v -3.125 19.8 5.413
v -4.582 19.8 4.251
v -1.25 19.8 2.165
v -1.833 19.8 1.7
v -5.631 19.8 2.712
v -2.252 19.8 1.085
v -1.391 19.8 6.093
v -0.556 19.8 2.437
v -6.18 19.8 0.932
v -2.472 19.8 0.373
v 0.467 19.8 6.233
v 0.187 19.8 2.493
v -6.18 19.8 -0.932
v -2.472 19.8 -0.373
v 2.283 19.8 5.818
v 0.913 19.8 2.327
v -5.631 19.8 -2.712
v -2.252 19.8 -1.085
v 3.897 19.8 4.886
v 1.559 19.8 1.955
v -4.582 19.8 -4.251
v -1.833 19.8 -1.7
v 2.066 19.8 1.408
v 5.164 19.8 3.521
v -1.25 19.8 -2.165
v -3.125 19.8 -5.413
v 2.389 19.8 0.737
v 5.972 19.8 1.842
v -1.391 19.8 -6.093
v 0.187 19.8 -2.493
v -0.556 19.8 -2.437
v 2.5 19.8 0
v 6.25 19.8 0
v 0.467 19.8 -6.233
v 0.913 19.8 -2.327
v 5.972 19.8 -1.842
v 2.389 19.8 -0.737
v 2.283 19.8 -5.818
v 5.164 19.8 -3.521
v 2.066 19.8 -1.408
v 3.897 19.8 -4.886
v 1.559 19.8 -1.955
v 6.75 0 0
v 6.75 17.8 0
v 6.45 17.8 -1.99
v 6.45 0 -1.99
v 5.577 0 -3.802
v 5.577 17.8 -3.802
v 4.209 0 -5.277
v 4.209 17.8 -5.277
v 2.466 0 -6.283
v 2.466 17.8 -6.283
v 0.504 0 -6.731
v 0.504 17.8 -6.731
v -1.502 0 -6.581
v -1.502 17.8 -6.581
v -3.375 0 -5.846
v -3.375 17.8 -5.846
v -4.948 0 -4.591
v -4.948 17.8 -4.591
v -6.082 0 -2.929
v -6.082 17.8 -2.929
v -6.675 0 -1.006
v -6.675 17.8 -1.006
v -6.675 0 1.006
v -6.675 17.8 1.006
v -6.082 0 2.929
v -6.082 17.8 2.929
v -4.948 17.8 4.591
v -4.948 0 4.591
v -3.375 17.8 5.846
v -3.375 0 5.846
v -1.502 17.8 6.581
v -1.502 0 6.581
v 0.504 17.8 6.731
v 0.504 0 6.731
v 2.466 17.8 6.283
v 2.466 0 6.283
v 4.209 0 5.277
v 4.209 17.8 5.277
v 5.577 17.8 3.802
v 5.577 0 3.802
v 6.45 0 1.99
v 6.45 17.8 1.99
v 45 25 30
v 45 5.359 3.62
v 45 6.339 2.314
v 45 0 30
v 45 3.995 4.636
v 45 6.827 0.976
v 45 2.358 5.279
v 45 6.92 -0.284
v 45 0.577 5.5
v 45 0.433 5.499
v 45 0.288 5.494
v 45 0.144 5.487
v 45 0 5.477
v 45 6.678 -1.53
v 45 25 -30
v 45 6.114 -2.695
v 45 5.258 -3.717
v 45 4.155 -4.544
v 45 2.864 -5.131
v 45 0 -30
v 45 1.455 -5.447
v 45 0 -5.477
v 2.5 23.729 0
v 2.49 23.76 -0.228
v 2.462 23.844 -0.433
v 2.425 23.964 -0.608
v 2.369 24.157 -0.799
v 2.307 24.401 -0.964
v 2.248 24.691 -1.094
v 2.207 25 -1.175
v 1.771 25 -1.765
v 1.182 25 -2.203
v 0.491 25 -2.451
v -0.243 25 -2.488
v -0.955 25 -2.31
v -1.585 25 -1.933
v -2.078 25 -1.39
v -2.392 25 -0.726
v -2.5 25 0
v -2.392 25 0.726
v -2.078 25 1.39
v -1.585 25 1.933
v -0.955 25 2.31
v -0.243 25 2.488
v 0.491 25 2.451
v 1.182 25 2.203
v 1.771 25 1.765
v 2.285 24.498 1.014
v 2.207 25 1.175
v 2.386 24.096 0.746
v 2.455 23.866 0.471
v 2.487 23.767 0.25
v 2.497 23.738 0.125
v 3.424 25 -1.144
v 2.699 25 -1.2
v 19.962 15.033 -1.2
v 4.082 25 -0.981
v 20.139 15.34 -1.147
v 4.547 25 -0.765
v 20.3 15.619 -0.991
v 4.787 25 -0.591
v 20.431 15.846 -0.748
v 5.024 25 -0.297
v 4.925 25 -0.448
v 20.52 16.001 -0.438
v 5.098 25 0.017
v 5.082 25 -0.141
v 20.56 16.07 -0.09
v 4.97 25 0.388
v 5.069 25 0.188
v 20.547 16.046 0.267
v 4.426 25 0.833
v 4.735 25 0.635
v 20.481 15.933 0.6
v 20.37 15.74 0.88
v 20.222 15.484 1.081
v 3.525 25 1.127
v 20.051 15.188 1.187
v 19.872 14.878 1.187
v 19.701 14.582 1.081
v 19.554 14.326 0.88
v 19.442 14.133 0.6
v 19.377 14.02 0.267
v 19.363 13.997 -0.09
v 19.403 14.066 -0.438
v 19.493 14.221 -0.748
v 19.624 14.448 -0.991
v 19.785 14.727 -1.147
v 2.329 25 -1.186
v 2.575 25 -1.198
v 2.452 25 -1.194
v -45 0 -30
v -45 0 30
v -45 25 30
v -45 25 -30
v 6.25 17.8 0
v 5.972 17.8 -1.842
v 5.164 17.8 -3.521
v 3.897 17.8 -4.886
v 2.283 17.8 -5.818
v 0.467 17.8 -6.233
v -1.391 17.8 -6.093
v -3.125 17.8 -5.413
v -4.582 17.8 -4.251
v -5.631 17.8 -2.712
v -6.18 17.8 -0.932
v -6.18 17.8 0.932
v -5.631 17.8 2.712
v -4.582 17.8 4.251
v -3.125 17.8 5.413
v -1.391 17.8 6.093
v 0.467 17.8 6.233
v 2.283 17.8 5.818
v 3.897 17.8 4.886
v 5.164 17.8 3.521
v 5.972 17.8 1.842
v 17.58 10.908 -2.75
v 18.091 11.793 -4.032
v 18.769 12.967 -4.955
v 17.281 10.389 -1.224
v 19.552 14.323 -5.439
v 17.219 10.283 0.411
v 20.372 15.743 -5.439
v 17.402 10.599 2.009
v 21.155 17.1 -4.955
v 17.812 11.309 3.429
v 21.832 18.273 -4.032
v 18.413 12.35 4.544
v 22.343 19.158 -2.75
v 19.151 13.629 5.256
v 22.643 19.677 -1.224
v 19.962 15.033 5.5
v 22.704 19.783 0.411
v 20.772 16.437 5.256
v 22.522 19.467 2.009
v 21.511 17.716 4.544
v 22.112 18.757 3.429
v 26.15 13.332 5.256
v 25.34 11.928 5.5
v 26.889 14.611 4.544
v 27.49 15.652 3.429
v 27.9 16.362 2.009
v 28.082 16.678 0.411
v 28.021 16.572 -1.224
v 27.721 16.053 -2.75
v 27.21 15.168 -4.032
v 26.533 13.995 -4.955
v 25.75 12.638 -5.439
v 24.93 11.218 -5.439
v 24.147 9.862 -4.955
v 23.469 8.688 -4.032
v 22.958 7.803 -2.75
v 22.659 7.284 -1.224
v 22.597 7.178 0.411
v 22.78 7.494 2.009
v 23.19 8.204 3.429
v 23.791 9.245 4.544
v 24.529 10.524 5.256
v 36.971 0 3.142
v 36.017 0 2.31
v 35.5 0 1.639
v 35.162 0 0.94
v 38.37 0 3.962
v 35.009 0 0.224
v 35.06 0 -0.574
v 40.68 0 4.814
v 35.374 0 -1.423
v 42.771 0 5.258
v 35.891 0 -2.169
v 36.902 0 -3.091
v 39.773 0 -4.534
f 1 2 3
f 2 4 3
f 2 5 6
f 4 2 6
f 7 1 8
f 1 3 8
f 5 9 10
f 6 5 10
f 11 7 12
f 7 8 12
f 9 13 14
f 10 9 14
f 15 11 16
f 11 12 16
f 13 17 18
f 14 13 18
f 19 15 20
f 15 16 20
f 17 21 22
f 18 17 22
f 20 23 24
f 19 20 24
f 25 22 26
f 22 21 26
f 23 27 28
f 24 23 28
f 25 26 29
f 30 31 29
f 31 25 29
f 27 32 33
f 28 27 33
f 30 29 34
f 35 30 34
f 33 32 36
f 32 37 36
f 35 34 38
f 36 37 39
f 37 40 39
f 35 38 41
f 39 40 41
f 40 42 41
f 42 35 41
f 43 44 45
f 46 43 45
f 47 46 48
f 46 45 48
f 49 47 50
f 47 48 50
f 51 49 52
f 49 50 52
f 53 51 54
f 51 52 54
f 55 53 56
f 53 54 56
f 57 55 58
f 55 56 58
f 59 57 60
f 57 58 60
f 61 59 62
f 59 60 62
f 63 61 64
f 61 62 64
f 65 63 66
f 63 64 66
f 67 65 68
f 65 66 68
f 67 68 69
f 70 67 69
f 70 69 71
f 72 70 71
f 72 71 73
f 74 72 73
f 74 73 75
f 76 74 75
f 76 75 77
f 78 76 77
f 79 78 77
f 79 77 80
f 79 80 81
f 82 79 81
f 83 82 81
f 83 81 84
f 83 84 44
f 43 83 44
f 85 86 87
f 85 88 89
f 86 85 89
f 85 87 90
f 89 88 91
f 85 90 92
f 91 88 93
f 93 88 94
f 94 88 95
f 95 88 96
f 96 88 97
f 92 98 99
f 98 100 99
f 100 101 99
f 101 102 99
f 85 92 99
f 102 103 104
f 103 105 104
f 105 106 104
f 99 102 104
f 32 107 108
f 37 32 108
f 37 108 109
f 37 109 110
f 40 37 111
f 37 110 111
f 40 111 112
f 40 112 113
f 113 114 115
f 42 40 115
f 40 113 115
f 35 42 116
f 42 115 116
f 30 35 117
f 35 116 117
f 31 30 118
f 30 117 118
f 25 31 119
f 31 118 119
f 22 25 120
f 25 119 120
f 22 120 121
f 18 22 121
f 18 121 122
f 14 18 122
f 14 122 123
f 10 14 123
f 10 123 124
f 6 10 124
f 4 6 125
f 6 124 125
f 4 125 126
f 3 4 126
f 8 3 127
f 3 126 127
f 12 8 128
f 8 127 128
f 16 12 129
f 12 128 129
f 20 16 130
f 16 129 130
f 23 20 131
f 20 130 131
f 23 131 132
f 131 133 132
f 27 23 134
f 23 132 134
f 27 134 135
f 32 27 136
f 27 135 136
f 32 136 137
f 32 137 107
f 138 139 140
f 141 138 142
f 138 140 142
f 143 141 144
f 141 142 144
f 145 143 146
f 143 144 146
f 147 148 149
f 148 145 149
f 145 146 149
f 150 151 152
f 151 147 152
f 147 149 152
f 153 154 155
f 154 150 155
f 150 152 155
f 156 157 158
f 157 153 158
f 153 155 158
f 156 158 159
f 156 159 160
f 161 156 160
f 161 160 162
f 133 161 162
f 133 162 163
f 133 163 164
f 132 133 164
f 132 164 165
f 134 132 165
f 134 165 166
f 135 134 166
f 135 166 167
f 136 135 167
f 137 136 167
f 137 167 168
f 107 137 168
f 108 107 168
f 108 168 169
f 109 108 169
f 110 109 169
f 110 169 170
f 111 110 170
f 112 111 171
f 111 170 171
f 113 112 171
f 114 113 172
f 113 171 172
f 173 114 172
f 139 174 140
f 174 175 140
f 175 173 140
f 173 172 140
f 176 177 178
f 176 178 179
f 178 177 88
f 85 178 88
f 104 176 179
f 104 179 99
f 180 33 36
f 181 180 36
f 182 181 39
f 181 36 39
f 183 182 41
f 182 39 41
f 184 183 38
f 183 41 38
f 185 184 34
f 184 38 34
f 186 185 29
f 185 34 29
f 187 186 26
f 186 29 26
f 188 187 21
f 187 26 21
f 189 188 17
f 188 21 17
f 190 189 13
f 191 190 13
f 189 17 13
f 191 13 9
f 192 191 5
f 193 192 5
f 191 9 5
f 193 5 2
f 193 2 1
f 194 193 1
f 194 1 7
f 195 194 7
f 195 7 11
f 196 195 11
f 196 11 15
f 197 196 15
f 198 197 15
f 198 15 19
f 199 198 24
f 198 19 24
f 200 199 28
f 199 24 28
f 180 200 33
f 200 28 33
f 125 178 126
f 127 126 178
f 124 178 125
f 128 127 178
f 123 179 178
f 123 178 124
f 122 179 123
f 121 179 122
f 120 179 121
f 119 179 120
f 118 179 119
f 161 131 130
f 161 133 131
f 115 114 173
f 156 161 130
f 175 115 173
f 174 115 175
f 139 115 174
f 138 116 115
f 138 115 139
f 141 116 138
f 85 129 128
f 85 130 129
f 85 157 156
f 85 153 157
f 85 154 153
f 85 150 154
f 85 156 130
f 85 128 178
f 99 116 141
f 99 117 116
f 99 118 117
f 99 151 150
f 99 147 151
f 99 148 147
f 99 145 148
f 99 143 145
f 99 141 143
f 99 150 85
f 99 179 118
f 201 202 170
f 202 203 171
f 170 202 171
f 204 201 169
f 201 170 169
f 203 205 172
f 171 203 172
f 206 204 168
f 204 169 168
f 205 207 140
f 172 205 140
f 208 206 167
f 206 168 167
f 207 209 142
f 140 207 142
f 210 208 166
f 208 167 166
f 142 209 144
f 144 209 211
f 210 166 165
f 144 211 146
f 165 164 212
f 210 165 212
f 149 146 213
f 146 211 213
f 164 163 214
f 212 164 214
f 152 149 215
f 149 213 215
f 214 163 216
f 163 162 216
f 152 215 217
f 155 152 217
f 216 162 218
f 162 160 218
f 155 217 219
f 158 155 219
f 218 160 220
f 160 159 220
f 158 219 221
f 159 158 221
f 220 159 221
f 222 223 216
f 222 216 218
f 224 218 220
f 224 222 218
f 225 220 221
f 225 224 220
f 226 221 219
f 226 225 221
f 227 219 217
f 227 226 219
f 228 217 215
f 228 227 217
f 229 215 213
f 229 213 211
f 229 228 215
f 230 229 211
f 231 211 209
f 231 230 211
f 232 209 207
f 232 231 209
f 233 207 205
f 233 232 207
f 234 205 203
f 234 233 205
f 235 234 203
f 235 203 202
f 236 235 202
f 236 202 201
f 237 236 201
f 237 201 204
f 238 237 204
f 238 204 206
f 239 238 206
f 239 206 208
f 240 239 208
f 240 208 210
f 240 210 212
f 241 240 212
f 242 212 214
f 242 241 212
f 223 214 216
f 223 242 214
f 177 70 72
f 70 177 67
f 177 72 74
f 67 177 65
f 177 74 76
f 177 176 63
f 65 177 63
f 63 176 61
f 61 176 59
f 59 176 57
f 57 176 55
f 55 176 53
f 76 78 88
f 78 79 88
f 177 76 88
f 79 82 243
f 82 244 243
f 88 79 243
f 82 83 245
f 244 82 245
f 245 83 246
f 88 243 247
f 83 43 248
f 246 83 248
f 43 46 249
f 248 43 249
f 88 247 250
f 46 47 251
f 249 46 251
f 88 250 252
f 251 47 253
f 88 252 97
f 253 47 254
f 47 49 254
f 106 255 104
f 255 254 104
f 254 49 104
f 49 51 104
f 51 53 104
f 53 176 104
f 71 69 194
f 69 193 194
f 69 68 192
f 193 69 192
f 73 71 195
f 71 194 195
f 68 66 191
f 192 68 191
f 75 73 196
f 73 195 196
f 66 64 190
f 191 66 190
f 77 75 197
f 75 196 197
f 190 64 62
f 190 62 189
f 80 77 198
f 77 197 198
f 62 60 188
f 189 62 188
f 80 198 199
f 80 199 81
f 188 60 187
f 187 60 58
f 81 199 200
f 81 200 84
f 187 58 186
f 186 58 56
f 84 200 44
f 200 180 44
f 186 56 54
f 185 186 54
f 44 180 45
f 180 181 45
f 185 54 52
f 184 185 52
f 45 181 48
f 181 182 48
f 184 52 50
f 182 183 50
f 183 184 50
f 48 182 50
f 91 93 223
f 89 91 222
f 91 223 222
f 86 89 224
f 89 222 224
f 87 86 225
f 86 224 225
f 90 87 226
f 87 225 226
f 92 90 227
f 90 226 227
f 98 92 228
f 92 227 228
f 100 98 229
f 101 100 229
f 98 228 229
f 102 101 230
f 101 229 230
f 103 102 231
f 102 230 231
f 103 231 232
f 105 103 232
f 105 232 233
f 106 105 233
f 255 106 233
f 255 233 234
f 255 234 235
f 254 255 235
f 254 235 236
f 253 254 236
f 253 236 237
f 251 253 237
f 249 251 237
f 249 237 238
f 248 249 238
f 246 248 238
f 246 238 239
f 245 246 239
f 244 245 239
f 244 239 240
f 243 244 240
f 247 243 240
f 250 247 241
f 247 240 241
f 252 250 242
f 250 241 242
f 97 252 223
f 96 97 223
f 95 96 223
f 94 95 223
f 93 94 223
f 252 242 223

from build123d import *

# Parameters (mm, degrees)
SKETCH2_W                = 90
SKETCH2_H                = 60
BOSS_EXTRUDE1_DEPTH      = 25
SKETCH11_R               = 2.5
CUT_EXTRUDE8_DEPTH       = 5.2
SKETCH17_R               = 6.25
CUT_EXTRUDE14_DEPTH      = 2
SKETCH18_R               = 6.75
CUT_EXTRUDE15_DEPTH      = 18.8
SKETCH20_R               = 5.5
CUT_EXTRUDE17_DEPTH      = 6.21
CUT_EXTRUDE17_DEPTH_BACK = 30
SKETCH26_R               = 1.2
CUT_EXTRUDE20_DEPTH      = 62.241905284


with BuildPart() as part:
    # Sketch2 → Boss-Extrude1 (new body)
    with BuildSketch(Plane(origin=(0, 0, 0), x_dir=(1, 0, 0), z_dir=(0, 1, 0))):
        Rectangle(SKETCH2_W, SKETCH2_H)
    extrude(amount=BOSS_EXTRUDE1_DEPTH)

    # Sketch11 → Cut-Extrude8 (cut)
    with BuildSketch(Plane(origin=(0, 25, 0), x_dir=(1, 0, 0), z_dir=(0, 1, 0))):
        Circle(SKETCH11_R)
    extrude(amount=-CUT_EXTRUDE8_DEPTH, mode=Mode.SUBTRACT)

    # Sketch17 → Cut-Extrude14 (cut)
    with BuildSketch(Plane(origin=(0, 19.8, 0), x_dir=(1, 0, 0), z_dir=(0, 1, 0))):
        Circle(SKETCH17_R)
    extrude(amount=-CUT_EXTRUDE14_DEPTH, mode=Mode.SUBTRACT)

    # Sketch18 → Cut-Extrude15 (cut, through all)
    with BuildSketch(Plane(origin=(0, 17.8, 0), x_dir=(1, 0, 0), z_dir=(0, 1, 0))):
        Circle(SKETCH18_R)
    extrude(amount=-CUT_EXTRUDE15_DEPTH, mode=Mode.SUBTRACT)

    # Sketch20 → Cut-Extrude17 (cut, two sides)
    with BuildSketch(Plane(origin=(13.839745962, -7.990381057, 0), x_dir=(0, 0, 1), z_dir=(-0.866025404, 0.5, 0))) as cut_extrude17_sk:
        with Locations((0, 23)):
            Circle(SKETCH20_R)
    extrude(amount=CUT_EXTRUDE17_DEPTH, mode=Mode.SUBTRACT)
    extrude(cut_extrude17_sk.sketch, amount=-CUT_EXTRUDE17_DEPTH_BACK, mode=Mode.SUBTRACT)

    # Sketch26 → Cut-Extrude20 (cut, through all)
    with BuildSketch(Plane(origin=(8.461728205, -4.885381057, 0), x_dir=(0, 0, -1), z_dir=(0.866025404, -0.5, 0))):
        with Locations((0, 23)):
            Circle(SKETCH26_R)
    extrude(amount=-CUT_EXTRUDE20_DEPTH, mode=Mode.SUBTRACT)


solid = part.part
